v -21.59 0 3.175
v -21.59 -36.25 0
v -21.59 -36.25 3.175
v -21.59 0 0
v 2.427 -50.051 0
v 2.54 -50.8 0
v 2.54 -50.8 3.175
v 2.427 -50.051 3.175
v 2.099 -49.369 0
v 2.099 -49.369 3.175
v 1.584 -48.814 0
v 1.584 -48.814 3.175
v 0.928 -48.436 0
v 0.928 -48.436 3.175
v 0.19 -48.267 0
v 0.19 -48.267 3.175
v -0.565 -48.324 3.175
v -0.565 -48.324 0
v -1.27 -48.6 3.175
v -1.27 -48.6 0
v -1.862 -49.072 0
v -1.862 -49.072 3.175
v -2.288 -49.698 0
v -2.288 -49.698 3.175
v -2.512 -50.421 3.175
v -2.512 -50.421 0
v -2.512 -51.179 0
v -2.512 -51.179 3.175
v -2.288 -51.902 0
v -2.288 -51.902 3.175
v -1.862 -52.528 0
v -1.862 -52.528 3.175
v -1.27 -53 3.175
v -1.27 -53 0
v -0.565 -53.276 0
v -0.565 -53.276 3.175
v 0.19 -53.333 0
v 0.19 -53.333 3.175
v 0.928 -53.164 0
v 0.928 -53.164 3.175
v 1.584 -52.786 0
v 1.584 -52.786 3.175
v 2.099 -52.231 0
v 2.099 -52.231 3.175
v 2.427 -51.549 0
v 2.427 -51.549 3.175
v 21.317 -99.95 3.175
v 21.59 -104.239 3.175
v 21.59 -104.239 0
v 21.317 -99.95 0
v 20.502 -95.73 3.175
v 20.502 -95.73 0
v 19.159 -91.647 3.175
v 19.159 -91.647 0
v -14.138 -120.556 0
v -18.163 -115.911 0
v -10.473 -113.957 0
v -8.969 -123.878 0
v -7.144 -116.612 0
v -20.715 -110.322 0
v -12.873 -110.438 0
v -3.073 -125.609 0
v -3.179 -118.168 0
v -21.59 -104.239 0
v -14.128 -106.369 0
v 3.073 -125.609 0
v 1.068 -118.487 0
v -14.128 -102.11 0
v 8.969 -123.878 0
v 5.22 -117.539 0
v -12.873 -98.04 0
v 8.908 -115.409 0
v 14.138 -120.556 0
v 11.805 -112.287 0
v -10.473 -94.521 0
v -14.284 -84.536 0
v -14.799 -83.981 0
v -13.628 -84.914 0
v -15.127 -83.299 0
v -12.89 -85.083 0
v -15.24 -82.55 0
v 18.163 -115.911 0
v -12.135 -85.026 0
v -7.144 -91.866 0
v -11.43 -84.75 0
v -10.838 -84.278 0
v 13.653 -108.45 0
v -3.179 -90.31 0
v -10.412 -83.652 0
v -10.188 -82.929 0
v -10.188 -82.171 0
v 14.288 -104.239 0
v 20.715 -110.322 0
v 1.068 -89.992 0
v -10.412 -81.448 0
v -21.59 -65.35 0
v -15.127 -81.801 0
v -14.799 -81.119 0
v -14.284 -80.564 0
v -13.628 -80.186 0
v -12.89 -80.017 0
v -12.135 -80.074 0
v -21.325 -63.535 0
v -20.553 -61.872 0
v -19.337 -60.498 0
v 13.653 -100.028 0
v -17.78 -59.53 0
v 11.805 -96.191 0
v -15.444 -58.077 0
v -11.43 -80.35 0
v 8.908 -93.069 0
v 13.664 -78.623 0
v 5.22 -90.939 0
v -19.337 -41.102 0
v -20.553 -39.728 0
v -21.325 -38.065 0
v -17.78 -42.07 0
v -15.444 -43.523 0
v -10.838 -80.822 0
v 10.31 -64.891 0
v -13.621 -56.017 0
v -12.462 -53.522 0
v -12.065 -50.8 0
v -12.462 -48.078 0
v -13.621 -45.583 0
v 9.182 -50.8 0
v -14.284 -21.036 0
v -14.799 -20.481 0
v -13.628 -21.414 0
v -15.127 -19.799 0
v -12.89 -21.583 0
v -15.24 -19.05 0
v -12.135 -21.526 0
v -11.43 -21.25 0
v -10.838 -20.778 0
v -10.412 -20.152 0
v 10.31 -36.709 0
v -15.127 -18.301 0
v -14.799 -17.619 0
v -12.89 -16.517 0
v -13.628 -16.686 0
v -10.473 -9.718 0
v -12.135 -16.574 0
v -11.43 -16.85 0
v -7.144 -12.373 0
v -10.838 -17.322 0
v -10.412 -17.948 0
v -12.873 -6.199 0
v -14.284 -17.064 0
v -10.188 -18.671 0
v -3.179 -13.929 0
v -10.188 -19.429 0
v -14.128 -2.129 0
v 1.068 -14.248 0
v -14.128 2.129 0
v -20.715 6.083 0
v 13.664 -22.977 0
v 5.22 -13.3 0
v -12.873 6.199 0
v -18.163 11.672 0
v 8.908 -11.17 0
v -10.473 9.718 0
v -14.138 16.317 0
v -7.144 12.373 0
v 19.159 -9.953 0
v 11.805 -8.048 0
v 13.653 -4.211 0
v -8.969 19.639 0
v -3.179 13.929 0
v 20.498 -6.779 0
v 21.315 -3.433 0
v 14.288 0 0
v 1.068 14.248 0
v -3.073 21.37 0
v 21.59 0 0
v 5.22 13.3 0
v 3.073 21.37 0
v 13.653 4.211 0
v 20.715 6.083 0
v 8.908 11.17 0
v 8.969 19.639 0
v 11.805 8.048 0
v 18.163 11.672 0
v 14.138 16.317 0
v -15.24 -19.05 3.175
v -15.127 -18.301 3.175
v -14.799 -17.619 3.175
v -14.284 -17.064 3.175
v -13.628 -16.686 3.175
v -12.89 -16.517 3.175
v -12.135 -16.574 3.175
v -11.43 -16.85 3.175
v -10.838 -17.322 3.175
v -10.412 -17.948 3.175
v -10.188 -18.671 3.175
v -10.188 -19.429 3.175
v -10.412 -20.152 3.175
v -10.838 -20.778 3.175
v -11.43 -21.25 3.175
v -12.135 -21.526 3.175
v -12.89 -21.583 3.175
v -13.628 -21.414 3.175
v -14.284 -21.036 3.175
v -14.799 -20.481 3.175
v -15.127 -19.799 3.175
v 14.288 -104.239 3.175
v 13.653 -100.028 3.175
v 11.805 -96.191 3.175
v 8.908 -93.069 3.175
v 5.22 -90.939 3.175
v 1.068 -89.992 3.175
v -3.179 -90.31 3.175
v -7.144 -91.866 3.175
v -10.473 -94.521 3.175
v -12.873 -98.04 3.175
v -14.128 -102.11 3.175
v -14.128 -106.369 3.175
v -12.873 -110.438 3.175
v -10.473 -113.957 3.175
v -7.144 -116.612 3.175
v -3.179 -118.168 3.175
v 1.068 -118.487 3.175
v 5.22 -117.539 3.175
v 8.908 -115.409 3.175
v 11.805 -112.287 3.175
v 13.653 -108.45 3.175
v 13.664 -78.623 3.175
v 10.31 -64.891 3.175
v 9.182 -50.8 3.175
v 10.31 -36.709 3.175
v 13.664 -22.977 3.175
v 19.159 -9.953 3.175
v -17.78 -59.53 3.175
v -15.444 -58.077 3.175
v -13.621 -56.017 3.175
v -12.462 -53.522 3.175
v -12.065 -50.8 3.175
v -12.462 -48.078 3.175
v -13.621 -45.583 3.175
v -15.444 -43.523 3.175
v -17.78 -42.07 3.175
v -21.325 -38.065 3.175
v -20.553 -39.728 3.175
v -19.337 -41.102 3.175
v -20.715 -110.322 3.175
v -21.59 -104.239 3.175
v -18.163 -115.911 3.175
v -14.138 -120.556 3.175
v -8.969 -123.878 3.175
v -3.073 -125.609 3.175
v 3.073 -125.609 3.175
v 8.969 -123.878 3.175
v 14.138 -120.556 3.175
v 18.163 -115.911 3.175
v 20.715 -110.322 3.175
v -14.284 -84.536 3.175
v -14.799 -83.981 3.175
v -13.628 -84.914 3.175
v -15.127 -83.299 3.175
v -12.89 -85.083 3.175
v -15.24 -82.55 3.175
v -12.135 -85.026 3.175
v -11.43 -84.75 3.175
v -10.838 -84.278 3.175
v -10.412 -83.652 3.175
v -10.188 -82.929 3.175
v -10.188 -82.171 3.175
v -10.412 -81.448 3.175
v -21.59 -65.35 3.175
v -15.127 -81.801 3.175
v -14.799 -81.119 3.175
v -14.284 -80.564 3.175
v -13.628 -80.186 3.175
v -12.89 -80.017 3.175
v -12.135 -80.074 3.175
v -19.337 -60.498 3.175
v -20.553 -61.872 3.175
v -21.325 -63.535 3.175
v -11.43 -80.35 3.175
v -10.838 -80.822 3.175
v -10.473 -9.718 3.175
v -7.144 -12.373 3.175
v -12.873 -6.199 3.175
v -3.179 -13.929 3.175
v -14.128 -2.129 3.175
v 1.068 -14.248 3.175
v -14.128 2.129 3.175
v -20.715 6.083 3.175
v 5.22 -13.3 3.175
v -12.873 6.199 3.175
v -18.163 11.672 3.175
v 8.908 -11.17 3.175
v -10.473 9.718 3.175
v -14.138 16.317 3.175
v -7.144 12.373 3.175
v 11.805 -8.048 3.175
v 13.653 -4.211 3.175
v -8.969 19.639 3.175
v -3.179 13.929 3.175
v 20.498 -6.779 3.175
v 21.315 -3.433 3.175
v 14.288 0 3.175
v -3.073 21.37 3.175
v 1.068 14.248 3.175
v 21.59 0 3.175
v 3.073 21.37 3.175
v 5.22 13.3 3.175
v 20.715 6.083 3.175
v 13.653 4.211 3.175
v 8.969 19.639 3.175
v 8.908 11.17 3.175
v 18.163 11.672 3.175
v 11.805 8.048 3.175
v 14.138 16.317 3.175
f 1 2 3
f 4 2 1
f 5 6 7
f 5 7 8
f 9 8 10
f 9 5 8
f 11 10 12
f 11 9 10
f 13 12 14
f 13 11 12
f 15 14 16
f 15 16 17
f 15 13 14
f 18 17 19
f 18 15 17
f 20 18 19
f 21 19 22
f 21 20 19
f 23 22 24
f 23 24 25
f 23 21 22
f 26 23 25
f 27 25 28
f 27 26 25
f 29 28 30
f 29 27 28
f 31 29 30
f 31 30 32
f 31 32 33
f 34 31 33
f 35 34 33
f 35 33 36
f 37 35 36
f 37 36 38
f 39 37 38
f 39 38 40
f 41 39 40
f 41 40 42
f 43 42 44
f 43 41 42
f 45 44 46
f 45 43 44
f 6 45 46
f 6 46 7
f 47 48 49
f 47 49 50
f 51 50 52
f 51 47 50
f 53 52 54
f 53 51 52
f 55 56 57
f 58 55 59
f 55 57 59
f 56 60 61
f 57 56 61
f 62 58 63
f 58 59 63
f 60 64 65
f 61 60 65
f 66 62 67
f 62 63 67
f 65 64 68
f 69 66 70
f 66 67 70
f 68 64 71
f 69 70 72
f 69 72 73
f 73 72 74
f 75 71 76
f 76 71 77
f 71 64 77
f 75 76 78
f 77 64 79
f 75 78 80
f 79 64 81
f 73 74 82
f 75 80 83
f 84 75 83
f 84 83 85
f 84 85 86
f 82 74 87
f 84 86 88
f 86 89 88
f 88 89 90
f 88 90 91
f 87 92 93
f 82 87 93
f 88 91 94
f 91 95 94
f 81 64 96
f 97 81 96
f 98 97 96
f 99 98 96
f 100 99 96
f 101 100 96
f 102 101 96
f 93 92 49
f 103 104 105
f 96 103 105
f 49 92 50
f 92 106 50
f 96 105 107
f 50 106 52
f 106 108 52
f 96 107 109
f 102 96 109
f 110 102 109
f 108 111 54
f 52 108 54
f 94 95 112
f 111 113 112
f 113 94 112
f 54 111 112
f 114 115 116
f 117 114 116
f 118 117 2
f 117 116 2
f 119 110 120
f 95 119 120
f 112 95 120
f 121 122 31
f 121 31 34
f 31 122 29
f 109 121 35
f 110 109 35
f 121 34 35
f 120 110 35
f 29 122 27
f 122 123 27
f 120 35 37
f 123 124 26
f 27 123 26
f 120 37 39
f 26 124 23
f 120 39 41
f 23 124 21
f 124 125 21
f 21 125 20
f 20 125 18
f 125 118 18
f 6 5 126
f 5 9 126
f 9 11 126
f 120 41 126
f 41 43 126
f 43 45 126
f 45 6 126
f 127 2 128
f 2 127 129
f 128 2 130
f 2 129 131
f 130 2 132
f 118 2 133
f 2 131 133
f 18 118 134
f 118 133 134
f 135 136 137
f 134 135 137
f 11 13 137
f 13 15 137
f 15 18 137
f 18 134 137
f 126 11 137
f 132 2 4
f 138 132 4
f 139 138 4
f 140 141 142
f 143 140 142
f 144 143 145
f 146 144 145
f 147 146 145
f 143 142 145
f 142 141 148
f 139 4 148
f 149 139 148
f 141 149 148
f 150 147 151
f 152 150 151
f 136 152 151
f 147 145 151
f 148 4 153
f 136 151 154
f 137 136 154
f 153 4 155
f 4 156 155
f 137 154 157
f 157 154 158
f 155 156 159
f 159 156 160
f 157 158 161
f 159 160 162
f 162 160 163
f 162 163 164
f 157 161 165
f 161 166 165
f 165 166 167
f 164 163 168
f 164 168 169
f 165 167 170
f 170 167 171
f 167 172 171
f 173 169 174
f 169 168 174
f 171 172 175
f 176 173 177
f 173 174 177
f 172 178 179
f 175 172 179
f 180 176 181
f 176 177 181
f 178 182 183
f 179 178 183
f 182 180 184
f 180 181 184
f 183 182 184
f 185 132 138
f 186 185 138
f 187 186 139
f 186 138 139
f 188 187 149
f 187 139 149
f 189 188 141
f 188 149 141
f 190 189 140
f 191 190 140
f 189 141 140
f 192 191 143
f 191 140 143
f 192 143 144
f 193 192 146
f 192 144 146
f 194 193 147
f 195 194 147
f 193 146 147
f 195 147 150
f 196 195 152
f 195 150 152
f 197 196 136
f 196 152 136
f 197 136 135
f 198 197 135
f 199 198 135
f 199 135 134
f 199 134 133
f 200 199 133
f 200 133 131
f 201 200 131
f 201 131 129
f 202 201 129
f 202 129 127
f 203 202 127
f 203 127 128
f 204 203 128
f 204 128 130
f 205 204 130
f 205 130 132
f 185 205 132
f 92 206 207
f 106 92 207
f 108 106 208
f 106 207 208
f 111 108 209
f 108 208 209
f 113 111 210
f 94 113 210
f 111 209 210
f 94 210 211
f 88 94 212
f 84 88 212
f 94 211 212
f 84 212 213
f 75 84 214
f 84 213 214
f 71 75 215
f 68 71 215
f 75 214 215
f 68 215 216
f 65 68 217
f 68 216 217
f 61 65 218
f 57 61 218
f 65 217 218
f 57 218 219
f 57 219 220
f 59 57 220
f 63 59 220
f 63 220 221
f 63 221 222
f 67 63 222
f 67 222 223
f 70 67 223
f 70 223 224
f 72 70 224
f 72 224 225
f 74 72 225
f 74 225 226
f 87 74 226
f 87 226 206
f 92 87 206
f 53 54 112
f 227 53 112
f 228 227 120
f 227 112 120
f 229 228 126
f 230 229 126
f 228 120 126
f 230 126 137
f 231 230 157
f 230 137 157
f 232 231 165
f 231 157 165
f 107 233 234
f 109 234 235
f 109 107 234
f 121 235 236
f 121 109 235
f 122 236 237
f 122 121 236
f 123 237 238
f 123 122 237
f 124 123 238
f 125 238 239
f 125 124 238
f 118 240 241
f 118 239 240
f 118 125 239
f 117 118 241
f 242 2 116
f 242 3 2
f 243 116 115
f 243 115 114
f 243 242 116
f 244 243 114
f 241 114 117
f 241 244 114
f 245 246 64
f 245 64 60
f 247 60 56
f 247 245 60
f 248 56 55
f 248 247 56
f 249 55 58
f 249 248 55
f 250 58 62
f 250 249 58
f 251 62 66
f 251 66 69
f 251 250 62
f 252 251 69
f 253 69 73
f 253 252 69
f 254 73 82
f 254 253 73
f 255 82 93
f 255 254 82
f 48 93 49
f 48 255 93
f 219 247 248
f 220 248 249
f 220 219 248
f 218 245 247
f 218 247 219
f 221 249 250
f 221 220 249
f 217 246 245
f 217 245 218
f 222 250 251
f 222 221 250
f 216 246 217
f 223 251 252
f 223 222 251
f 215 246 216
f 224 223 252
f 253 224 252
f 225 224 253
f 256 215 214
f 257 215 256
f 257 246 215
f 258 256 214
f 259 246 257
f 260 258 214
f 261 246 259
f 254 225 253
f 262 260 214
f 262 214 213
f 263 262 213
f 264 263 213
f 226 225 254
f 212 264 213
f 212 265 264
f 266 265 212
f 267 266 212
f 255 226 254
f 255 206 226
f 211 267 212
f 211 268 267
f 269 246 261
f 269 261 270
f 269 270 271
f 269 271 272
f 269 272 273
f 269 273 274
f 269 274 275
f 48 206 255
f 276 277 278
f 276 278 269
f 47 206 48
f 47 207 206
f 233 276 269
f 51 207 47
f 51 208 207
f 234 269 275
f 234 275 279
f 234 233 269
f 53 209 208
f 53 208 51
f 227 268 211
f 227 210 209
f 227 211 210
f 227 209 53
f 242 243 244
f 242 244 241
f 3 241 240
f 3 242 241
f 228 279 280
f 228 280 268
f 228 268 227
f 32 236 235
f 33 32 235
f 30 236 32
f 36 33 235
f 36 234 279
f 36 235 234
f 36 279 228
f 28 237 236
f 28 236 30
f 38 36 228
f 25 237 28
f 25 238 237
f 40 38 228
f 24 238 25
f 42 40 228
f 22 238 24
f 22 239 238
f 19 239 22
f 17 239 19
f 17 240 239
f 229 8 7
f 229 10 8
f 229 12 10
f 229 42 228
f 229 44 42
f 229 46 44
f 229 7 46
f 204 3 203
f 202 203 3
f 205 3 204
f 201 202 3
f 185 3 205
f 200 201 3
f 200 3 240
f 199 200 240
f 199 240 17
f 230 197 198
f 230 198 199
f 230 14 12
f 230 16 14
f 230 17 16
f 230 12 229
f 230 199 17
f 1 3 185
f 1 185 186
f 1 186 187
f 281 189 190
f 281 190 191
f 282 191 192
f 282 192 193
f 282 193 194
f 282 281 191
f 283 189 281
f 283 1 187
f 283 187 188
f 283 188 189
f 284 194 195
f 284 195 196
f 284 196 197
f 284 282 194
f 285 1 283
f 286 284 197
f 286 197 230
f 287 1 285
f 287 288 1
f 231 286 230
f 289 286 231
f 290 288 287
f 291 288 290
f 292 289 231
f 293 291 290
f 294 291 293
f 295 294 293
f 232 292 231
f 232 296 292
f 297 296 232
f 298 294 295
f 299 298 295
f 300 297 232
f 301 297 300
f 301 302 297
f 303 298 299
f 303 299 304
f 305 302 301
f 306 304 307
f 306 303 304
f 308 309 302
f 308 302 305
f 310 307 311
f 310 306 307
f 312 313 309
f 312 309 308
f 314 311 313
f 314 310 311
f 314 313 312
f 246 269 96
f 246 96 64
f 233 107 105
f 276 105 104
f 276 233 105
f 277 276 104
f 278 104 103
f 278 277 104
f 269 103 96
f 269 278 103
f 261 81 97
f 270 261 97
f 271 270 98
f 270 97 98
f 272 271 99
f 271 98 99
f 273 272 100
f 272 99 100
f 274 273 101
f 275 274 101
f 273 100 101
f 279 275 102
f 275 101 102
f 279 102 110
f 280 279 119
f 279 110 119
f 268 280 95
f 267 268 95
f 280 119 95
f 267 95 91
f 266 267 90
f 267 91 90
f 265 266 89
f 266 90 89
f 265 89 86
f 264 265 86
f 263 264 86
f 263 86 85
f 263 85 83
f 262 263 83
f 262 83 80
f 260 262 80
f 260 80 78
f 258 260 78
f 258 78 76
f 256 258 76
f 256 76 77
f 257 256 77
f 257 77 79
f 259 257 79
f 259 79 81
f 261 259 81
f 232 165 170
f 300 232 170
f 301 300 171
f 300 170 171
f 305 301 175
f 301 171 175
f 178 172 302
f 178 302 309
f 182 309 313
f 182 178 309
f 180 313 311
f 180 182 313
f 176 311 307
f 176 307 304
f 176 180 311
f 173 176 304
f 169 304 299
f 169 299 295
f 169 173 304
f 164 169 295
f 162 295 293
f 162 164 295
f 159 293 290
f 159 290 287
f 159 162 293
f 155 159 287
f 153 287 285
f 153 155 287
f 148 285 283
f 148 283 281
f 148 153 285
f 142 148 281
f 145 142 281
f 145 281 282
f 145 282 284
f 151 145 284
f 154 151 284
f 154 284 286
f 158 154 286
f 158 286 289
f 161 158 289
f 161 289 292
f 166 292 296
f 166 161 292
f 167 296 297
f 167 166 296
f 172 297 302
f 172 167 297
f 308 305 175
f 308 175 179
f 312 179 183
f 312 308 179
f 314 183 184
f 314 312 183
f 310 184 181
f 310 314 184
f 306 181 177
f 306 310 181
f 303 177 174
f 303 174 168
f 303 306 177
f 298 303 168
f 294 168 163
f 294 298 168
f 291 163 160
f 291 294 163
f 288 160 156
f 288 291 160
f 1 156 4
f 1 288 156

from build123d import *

# Parameters (mm, degrees)
SKETCH1_R           = 14.2875
SKETCH1_R_2         = 2.54
BOSS_EXTRUDE1_DEPTH = 3.175
CUT_EXTRUDE1_DEPTH  = 162.674043733
FILLET3_R           = 6.35
SKETCH3_R           = 2.54
BOSS_EXTRUDE3_DEPTH = 3.175
SKETCH6_R           = 2.54
BOSS_EXTRUDE4_DEPTH = 3.175
FILLET2_R           = 6.35
CUT_EXTRUDE2_DEPTH  = 169.237022961
CUT_EXTRUDE3_DEPTH  = 169.237022961
CUT_EXTRUDE4_DEPTH  = 168.265702461
BOSS_EXTRUDE7_DEPTH = 3.175
SKETCH14_R          = 14.2875
BOSS_EXTRUDE8_DEPTH = 3.175
SKETCH15_R          = 14.2875
CUT_EXTRUDE5_DEPTH  = 128.70732581
CUT_EXTRUDE6_DEPTH  = 128.70732581
SKETCH17_R          = 2.54
CUT_EXTRUDE7_DEPTH  = 128.70732581


with BuildPart() as part:
    # Sketch1 → Boss-Extrude1 (new body)
    with BuildSketch(Plane.XY):
        with BuildLine():
            Line((-8.89, 25.4), (8.89, 25.4))
            ThreePointArc((8.89, 25.4), (17.870256121, 21.680256121), (21.59, 12.7))
            Line((21.59, 12.7), (21.59, -117.775079775))
            ThreePointArc((21.59, -117.775079775), (21.127743647, -120.388718212), (19.797058824, -122.685251408))
            Line((19.797058824, -122.685251408), (-7.952696208, -155.616779465))
            ThreePointArc((-7.952696208, -155.616779465), (-12.268297602, -157.851943494), (-16.900388255, -156.380852124))
            Line((-16.900388255, -156.380852124), (-32.439211784, -143.287061102))
            ThreePointArc((-32.439211784, -143.287061102), (-34.674375812, -138.971459708), (-33.203284443, -134.339369055))
            Line((-33.203284443, -134.339369055), (-23.382941176, -122.685251408))
            ThreePointArc((-23.382941176, -122.685251408), (-22.052256353, -120.388718212), (-21.59, -117.775079775))
            Line((-21.59, -117.775079775), (-21.59, 12.7))
            ThreePointArc((-21.59, 12.7), (-17.870256121, 21.680256121), (-8.89, 25.4))
        make_face()
        Circle(SKETCH1_R, mode=Mode.SUBTRACT)
        with Locations((0, -101.6)):
            Circle(SKETCH1_R, mode=Mode.SUBTRACT)
        with Locations((-18.532085478, -142.550133084)):
            Circle(SKETCH1_R_2, mode=Mode.SUBTRACT)
        with Locations((0, -50.8)):
            Circle(SKETCH1_R_2, mode=Mode.SUBTRACT)
    extrude(amount=BOSS_EXTRUDE1_DEPTH)

    # Sketch2 → Cut-Extrude1 (cut, through all)
    with BuildSketch(Plane.XY):
        with BuildLine():
            ThreePointArc((19.159083004, -91.647229609), (9.182340769, -50.8), (19.159083004, -9.952770391))
            ThreePointArc((19.159083004, -9.952770391), (20.973467787, -5.122670102), (21.59, 0))
            Line((21.59, 0), (27.94, 0))
            Line((27.94, 0), (27.94, -121.656687185))
            Line((27.94, -121.656687185), (-7.620284479, -163.8572221))
            Line((-7.620284479, -163.8572221), (-17.501317584, -155.874478972))
            Line((-17.501317584, -155.874478972), (16.51, -115.512152961))
            ThreePointArc((16.51, -115.512152961), (20.280273667, -109.005308906), (21.59, -101.6))
            ThreePointArc((21.59, -101.6), (20.973467787, -96.477329898), (19.159083004, -91.647229609))
        make_face()
        with BuildLine():
            Line((-21.59, -41.275), (-21.59, -60.325))
            ThreePointArc((-21.59, -60.325), (-12.065, -50.8), (-21.59, -41.275))
        make_face()
    extrude(amount=CUT_EXTRUDE1_DEPTH, mode=Mode.SUBTRACT)


with BuildPart() as cut_extrude1_piece_1:
    # of the separate pieces the step leaves, piece 1, a body of its own (cut_extrude1_pieces)
    add(part.part.solids().sort_by_distance((-8.89, 25.4, 0))[0])

    # Fillet3
    fillet3_edges = [cut_extrude1_piece_1.edges().sort_by_distance(p)[0] for p in [
        (-21.59, -41.275, 1.5875),
        (-21.59, -60.325, 1.5875),
    ]]
    fillet(fillet3_edges, radius=FILLET3_R)

    # Sketch3 → Boss-Extrude3 (add)
    with BuildSketch(Plane.XY.offset(3.175)):
        with BuildLine():
            Line((-27.351416194, -127.394768527), (-36.025496499, -137.688579))
            ThreePointArc((-36.025496499, -137.688579), (-37.217489152, -141.441859142), (-35.4063854, -144.93869507))
            Line((-35.4063854, -144.93869507), (-24.403104784, -154.210610454))
            ThreePointArc((-24.403104784, -154.210610454), (-19.771014132, -155.681701823), (-15.455412737, -153.446537795))
            Line((-15.455412737, -153.446537795), (-7.557639641, -144.073996091))
            Line((-7.557639641, -144.073996091), (-27.351416194, -127.394768527))
        make_face()
        with Locations((-18.532085478, -142.550133084)):
            Circle(SKETCH3_R, mode=Mode.SUBTRACT)
    extrude(amount=-BOSS_EXTRUDE3_DEPTH)

    # Sketch6 → Boss-Extrude4 (add)
    with BuildSketch(Plane.XY.offset(3.175)):
        Polygon((-35.4063854, -144.93869507), (-63.620410749, -121.164144113), (-51.344981666, -106.596497054), (-27.065569901, -127.055545526), align=None)
        with Locations((-52.626813855, -117.972130278)):
            Circle(SKETCH6_R, mode=Mode.SUBTRACT)
    extrude(amount=-BOSS_EXTRUDE4_DEPTH)

    # Fillet2
    fillet2_edges = [cut_extrude1_piece_1.edges().sort_by_distance(p)[0] for p in [
        (-63.620410749, -121.164144113, 1.5875),
        (-51.344981666, -106.596497054, 1.5875),
        (-27.065569901, -127.055545526, 1.5875),
    ]]
    fillet(fillet2_edges, radius=FILLET2_R)

    # Sketch7 → Cut-Extrude2 (cut, through all)
    with BuildSketch(Plane.XY.offset(3.175)):
        with BuildLine():
            Line((-21.59, 0), (-21.59, 31.75))
            Line((-21.59, 31.75), (21.59, 31.75))
            Line((21.59, 31.75), (21.59, 0))
            ThreePointArc((21.59, 0), (0, 21.59), (-21.59, 0))
        make_face()
    extrude(amount=-CUT_EXTRUDE2_DEPTH, mode=Mode.SUBTRACT)


with BuildPart() as cut_extrude1_piece_2:
    # of the separate pieces the step leaves, piece 2, a body of its own (cut_extrude1_pieces)
    add(part.part.solids().sort_by_distance((-16.900388255, -156.380852124, 0))[0])


with BuildPart() as cut_extrude3_tool:
    # Sketch10 → Cut-Extrude3 (new, through all)
    with BuildSketch(Plane.XY.offset(3.175)):
        with BuildLine():
            Line((-18.151882461, -155.32628042), (-17.361482582, -157.512020269))
            Line((-17.361482582, -157.512020269), (-14.375706423, -156.432313955))
            Line((-14.375706423, -156.432313955), (-15.455412737, -153.446537795))
            ThreePointArc((-15.455412737, -153.446537795), (-16.679911193, -154.563907595), (-18.151882461, -155.32628042))
        make_face()
    extrude(amount=-CUT_EXTRUDE3_DEPTH)


with BuildPart() as cut_extrude1_piece_1_1:
    add(cut_extrude1_piece_1.part)

    # Cut-Extrude3: cut by cut_extrude3_tool
    add(cut_extrude3_tool.part, mode=Mode.SUBTRACT)

    # Sketch12 → Cut-Extrude4 (cut, through all)
    with BuildSketch(Plane.XY.offset(3.175)):
        with BuildLine():
            Line((-21.59, -101.6), (-72.39, -101.6))
            Line((-72.39, -101.6), (-72.39, -165.1))
            Line((-72.39, -165.1), (16.51, -165.1))
            Line((16.51, -165.1), (16.51, -115.512152961))
            ThreePointArc((16.51, -115.512152961), (-7.405308906, -121.880273667), (-21.59, -101.6))
        make_face()
    extrude(amount=-CUT_EXTRUDE4_DEPTH, mode=Mode.SUBTRACT)

    # Sketch13 → Boss-Extrude7 (add, through all)
    with BuildSketch(Plane.XY.offset(3.175)):
        with BuildLine():
            Line((-21.59, -101.6), (-21.59, -104.23906))
            ThreePointArc((-21.59, -104.23906), (0, -125.82906), (21.59, -104.23906))
            Line((21.59, -104.23906), (21.59, -101.6))
            Line((21.59, -101.6), (6.662926134, -118.366401535))
            Line((6.662926134, -118.366401535), (-7.350026675, -118.366401535))
            Line((-7.350026675, -118.366401535), (-21.59, -101.6))
        make_face()
    extrude(amount=-BOSS_EXTRUDE7_DEPTH)

    # Sketch14 → Boss-Extrude8 (add, through all)
    with BuildSketch(Plane.XY.offset(3.175)):
        with Locations((0, -101.6)):
            Circle(SKETCH14_R)
    extrude(amount=-BOSS_EXTRUDE8_DEPTH)

    # Sketch15 → Cut-Extrude5 (cut, through all)
    with BuildSketch(Plane.XY.offset(3.175)):
        with Locations((0, -104.23906)):
            Circle(SKETCH15_R)
    extrude(amount=-CUT_EXTRUDE5_DEPTH, mode=Mode.SUBTRACT)

    # Sketch16 → Cut-Extrude6 (cut, through all)
    with BuildSketch(Plane.XY.offset(3.175)):
        with BuildLine():
            Line((19.159083004, -91.647229609), (21.59, -91.647229609))
            Line((21.59, -91.647229609), (21.59, -104.23906))
            ThreePointArc((21.59, -104.23906), (20.97671132, -97.826892854), (19.159083004, -91.647229609))
        make_face()
    extrude(amount=-CUT_EXTRUDE6_DEPTH, mode=Mode.SUBTRACT)

    # Sketch17 → Cut-Extrude7 (cut, through all)
    with BuildSketch(Plane(origin=(0, 0, 0), x_dir=(-1, 0, 0), z_dir=(0, 0, -1))):
        with Locations((12.7, -19.05)):
            Circle(SKETCH17_R)
        with Locations((12.7, -82.55)):
            Circle(SKETCH17_R)
        with Locations(Location((0, -50.8, 0), (0, 0, 180))):
            Circle(SKETCH17_R)
    extrude(amount=-CUT_EXTRUDE7_DEPTH, mode=Mode.SUBTRACT)


with BuildPart() as cut_extrude1_piece_2_1:
    add(cut_extrude1_piece_2.part)

    # Cut-Extrude3: cut by cut_extrude3_tool
    add(cut_extrude3_tool.part, mode=Mode.SUBTRACT)


solid = cut_extrude1_piece_1_1.part
